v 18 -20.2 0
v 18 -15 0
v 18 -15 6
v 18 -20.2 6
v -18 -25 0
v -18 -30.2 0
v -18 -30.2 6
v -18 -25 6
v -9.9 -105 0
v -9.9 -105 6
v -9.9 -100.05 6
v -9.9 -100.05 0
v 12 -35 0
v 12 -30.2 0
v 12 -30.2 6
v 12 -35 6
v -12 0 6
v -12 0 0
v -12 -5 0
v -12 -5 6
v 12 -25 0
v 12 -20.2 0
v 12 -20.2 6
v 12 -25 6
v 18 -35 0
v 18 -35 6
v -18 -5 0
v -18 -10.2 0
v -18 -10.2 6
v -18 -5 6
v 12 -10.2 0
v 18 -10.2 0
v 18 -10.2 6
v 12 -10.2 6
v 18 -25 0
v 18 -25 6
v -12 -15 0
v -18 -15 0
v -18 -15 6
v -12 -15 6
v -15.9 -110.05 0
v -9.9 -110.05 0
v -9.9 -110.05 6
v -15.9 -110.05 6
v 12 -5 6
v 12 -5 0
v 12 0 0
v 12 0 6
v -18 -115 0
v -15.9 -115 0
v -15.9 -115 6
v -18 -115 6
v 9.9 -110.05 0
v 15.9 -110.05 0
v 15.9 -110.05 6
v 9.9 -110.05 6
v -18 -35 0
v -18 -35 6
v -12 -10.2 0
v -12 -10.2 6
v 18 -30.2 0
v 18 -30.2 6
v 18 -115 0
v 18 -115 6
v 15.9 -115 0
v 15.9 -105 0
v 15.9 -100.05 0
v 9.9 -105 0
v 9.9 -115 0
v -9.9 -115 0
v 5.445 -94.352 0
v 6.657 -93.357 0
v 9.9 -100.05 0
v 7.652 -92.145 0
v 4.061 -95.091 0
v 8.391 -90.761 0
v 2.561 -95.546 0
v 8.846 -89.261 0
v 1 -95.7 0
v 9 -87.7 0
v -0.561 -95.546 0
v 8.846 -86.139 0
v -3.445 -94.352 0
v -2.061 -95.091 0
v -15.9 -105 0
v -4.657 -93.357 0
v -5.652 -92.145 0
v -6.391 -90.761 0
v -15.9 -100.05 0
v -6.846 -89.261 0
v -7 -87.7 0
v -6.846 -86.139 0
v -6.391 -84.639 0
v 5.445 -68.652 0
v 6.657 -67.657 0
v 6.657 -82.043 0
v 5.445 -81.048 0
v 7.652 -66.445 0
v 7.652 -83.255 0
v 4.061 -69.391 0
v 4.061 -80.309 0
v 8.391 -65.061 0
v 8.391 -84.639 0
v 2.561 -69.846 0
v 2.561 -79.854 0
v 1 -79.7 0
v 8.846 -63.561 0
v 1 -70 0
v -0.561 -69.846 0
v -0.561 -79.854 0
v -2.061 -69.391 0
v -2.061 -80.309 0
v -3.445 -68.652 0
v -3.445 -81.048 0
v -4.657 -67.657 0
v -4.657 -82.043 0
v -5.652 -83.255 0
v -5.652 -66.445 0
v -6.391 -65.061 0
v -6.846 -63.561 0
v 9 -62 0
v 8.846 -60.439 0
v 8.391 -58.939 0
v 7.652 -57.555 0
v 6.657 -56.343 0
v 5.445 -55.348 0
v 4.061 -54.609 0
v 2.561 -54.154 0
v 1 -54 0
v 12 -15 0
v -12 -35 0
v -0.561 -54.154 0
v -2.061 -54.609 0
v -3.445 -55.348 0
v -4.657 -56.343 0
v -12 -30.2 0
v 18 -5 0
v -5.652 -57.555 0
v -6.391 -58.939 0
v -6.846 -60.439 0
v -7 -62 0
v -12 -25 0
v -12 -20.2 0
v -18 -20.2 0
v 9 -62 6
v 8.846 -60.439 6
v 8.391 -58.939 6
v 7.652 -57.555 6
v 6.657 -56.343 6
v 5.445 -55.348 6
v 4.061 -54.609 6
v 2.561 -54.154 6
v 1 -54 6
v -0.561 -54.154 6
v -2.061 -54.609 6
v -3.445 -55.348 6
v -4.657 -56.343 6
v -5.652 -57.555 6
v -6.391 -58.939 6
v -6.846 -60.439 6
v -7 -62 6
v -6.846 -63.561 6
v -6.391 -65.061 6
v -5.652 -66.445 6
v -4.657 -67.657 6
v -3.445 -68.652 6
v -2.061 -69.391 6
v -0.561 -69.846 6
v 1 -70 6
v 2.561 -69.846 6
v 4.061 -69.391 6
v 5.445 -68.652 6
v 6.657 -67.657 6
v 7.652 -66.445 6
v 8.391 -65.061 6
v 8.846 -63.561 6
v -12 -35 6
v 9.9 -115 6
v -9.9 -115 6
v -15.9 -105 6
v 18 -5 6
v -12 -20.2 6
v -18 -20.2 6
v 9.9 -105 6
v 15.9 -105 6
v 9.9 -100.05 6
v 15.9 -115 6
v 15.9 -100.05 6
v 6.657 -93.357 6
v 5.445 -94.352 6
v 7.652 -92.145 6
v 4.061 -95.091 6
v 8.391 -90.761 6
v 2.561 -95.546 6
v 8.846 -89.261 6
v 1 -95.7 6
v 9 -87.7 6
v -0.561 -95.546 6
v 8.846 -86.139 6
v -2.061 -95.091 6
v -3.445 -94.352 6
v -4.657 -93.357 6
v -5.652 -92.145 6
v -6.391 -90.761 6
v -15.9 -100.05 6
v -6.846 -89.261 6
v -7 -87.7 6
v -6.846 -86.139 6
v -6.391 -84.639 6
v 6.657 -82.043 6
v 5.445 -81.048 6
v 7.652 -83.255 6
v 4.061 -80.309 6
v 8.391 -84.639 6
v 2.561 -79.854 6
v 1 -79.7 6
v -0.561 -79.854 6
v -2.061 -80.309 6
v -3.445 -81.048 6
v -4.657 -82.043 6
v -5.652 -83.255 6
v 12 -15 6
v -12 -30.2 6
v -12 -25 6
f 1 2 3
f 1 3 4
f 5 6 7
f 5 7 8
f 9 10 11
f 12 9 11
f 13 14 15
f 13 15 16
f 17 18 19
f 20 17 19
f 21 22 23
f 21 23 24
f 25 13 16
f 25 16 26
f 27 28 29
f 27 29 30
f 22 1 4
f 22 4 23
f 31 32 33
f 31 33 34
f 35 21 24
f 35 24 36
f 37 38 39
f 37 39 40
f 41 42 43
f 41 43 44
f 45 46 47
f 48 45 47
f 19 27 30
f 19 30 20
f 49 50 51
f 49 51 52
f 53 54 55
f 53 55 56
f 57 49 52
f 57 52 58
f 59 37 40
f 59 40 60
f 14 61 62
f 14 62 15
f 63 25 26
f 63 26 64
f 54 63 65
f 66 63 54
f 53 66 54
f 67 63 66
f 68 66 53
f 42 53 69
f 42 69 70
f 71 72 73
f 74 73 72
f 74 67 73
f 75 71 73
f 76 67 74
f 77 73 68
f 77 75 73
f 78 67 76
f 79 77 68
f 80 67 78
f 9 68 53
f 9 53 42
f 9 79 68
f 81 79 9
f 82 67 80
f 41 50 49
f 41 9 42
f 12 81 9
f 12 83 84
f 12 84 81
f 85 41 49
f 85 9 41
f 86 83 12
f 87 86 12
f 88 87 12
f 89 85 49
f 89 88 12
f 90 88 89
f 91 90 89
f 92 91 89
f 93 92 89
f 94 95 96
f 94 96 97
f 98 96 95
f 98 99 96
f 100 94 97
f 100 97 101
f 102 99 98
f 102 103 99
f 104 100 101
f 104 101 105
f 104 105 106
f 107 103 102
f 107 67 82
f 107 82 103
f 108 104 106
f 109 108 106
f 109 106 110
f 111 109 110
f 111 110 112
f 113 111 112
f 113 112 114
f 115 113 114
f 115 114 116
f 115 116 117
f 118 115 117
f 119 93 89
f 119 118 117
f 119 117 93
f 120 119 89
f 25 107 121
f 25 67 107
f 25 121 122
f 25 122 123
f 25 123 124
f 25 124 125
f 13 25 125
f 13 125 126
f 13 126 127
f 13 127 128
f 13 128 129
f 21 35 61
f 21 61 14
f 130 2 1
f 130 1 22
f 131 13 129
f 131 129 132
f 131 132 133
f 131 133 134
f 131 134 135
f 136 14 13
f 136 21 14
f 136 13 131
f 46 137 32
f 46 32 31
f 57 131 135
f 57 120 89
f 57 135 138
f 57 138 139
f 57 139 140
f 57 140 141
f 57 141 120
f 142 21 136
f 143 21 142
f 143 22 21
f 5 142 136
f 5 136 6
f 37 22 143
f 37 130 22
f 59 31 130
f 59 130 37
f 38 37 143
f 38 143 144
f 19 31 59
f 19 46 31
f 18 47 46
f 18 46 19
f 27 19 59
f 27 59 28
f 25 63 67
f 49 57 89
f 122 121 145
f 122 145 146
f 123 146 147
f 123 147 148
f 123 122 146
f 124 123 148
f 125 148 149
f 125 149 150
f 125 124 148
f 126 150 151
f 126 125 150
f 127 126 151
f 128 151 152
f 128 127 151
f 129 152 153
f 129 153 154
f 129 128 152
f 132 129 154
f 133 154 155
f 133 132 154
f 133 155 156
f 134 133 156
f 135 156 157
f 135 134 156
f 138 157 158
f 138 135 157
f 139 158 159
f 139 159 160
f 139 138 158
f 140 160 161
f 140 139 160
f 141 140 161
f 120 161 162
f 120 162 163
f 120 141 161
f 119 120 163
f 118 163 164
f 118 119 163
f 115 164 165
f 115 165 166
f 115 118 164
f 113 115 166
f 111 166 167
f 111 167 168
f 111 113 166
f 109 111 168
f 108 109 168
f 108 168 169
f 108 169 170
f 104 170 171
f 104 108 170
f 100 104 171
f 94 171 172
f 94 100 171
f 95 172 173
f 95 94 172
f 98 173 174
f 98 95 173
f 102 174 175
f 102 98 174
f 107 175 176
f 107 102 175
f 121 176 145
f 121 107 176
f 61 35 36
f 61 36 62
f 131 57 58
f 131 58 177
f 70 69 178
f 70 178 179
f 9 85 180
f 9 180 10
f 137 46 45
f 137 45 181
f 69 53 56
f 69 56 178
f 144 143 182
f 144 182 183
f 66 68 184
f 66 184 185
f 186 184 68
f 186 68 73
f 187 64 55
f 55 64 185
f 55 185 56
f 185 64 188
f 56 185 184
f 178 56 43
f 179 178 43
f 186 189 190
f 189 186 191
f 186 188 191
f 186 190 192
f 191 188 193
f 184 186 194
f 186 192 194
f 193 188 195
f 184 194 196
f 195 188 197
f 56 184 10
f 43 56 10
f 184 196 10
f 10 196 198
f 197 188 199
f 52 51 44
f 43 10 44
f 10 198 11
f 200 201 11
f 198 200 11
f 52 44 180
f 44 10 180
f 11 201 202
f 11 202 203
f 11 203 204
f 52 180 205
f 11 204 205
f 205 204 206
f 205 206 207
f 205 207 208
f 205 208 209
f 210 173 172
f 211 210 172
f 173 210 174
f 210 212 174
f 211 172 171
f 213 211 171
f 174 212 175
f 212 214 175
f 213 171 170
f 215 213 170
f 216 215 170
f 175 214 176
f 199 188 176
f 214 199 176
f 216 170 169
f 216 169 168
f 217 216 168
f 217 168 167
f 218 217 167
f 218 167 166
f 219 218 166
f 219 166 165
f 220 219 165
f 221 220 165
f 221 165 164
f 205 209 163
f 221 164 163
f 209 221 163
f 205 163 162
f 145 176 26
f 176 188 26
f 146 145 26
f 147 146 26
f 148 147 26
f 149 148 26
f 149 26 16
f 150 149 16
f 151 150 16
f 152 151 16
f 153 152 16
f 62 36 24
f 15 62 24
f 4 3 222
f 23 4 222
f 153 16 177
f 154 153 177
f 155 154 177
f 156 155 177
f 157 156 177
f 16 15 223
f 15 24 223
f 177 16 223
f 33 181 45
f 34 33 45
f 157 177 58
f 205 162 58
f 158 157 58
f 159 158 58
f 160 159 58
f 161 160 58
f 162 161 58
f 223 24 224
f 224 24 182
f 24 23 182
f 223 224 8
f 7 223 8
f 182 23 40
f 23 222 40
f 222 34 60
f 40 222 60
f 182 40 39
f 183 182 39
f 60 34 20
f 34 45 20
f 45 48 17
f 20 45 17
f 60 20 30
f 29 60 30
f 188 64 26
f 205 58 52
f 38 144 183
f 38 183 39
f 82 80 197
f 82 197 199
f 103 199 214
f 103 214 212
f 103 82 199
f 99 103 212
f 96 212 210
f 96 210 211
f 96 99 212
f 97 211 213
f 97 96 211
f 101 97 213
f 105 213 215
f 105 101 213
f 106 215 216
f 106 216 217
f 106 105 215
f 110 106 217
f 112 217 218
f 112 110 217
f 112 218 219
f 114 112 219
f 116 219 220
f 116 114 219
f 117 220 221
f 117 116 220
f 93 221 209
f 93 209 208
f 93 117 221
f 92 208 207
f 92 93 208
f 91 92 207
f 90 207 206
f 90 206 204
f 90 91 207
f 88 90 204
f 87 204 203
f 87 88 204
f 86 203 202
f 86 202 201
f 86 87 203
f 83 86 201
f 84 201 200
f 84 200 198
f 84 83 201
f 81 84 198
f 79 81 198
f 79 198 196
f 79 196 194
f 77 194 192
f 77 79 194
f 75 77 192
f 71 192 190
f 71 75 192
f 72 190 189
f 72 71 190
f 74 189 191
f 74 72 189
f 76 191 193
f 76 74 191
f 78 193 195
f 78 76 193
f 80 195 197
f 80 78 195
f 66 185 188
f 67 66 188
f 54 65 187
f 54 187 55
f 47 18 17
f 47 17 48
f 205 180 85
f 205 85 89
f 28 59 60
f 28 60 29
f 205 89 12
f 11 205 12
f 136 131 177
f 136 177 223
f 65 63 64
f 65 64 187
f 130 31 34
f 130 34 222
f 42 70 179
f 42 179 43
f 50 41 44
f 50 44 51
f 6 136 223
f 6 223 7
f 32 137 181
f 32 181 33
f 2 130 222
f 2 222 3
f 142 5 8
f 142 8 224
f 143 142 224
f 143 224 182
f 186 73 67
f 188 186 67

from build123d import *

# Parameters (mm, degrees)
ESQUISSE1_R        = 8
ESQUISSE1_W        = 6
ESQUISSE1_H        = 4.95
BOSS_EXTRU_1_DEPTH = 6


with BuildPart() as part:
    # Esquisse1 → Boss.-Extru.1 (new body)
    with BuildSketch(Plane.XY):
        Polygon((-12, 0), (12, 0), (12, -0.2), (12, -5), (18, -5), (18, -10.2), (12, -10.2), (12, -15), (18, -15), (18, -20.2), (12, -20.2), (12, -25), (18, -25), (18, -30.2), (12, -30.2), (12, -35), (18, -35), (18, -115), (15.9, -115), (15.9, -110.05), (9.9, -110.05), (9.9, -115), (-9.9, -115), (-9.9, -110.05), (-15.9, -110.05), (-15.9, -115), (-18, -115), (-18, -35), (-12, -35), (-12, -30.2), (-18, -30.2), (-18, -25), (-12, -25), (-12, -20.2), (-18, -20.2), (-18, -15), (-12, -15), (-12, -10.2), (-18, -10.2), (-18, -5), (-12, -5), (-12, -0.2), align=None)
        with Locations((1, -87.7)):
            Circle(ESQUISSE1_R, mode=Mode.SUBTRACT)
        with Locations((1, -62)):
            Circle(ESQUISSE1_R, mode=Mode.SUBTRACT)
        with Locations((-12.9, -102.525)):
            Rectangle(ESQUISSE1_W, ESQUISSE1_H, mode=Mode.SUBTRACT)
        with Locations((12.9, -102.525)):
            Rectangle(ESQUISSE1_W, ESQUISSE1_H, mode=Mode.SUBTRACT)
    extrude(amount=BOSS_EXTRU_1_DEPTH)


solid = part.part
